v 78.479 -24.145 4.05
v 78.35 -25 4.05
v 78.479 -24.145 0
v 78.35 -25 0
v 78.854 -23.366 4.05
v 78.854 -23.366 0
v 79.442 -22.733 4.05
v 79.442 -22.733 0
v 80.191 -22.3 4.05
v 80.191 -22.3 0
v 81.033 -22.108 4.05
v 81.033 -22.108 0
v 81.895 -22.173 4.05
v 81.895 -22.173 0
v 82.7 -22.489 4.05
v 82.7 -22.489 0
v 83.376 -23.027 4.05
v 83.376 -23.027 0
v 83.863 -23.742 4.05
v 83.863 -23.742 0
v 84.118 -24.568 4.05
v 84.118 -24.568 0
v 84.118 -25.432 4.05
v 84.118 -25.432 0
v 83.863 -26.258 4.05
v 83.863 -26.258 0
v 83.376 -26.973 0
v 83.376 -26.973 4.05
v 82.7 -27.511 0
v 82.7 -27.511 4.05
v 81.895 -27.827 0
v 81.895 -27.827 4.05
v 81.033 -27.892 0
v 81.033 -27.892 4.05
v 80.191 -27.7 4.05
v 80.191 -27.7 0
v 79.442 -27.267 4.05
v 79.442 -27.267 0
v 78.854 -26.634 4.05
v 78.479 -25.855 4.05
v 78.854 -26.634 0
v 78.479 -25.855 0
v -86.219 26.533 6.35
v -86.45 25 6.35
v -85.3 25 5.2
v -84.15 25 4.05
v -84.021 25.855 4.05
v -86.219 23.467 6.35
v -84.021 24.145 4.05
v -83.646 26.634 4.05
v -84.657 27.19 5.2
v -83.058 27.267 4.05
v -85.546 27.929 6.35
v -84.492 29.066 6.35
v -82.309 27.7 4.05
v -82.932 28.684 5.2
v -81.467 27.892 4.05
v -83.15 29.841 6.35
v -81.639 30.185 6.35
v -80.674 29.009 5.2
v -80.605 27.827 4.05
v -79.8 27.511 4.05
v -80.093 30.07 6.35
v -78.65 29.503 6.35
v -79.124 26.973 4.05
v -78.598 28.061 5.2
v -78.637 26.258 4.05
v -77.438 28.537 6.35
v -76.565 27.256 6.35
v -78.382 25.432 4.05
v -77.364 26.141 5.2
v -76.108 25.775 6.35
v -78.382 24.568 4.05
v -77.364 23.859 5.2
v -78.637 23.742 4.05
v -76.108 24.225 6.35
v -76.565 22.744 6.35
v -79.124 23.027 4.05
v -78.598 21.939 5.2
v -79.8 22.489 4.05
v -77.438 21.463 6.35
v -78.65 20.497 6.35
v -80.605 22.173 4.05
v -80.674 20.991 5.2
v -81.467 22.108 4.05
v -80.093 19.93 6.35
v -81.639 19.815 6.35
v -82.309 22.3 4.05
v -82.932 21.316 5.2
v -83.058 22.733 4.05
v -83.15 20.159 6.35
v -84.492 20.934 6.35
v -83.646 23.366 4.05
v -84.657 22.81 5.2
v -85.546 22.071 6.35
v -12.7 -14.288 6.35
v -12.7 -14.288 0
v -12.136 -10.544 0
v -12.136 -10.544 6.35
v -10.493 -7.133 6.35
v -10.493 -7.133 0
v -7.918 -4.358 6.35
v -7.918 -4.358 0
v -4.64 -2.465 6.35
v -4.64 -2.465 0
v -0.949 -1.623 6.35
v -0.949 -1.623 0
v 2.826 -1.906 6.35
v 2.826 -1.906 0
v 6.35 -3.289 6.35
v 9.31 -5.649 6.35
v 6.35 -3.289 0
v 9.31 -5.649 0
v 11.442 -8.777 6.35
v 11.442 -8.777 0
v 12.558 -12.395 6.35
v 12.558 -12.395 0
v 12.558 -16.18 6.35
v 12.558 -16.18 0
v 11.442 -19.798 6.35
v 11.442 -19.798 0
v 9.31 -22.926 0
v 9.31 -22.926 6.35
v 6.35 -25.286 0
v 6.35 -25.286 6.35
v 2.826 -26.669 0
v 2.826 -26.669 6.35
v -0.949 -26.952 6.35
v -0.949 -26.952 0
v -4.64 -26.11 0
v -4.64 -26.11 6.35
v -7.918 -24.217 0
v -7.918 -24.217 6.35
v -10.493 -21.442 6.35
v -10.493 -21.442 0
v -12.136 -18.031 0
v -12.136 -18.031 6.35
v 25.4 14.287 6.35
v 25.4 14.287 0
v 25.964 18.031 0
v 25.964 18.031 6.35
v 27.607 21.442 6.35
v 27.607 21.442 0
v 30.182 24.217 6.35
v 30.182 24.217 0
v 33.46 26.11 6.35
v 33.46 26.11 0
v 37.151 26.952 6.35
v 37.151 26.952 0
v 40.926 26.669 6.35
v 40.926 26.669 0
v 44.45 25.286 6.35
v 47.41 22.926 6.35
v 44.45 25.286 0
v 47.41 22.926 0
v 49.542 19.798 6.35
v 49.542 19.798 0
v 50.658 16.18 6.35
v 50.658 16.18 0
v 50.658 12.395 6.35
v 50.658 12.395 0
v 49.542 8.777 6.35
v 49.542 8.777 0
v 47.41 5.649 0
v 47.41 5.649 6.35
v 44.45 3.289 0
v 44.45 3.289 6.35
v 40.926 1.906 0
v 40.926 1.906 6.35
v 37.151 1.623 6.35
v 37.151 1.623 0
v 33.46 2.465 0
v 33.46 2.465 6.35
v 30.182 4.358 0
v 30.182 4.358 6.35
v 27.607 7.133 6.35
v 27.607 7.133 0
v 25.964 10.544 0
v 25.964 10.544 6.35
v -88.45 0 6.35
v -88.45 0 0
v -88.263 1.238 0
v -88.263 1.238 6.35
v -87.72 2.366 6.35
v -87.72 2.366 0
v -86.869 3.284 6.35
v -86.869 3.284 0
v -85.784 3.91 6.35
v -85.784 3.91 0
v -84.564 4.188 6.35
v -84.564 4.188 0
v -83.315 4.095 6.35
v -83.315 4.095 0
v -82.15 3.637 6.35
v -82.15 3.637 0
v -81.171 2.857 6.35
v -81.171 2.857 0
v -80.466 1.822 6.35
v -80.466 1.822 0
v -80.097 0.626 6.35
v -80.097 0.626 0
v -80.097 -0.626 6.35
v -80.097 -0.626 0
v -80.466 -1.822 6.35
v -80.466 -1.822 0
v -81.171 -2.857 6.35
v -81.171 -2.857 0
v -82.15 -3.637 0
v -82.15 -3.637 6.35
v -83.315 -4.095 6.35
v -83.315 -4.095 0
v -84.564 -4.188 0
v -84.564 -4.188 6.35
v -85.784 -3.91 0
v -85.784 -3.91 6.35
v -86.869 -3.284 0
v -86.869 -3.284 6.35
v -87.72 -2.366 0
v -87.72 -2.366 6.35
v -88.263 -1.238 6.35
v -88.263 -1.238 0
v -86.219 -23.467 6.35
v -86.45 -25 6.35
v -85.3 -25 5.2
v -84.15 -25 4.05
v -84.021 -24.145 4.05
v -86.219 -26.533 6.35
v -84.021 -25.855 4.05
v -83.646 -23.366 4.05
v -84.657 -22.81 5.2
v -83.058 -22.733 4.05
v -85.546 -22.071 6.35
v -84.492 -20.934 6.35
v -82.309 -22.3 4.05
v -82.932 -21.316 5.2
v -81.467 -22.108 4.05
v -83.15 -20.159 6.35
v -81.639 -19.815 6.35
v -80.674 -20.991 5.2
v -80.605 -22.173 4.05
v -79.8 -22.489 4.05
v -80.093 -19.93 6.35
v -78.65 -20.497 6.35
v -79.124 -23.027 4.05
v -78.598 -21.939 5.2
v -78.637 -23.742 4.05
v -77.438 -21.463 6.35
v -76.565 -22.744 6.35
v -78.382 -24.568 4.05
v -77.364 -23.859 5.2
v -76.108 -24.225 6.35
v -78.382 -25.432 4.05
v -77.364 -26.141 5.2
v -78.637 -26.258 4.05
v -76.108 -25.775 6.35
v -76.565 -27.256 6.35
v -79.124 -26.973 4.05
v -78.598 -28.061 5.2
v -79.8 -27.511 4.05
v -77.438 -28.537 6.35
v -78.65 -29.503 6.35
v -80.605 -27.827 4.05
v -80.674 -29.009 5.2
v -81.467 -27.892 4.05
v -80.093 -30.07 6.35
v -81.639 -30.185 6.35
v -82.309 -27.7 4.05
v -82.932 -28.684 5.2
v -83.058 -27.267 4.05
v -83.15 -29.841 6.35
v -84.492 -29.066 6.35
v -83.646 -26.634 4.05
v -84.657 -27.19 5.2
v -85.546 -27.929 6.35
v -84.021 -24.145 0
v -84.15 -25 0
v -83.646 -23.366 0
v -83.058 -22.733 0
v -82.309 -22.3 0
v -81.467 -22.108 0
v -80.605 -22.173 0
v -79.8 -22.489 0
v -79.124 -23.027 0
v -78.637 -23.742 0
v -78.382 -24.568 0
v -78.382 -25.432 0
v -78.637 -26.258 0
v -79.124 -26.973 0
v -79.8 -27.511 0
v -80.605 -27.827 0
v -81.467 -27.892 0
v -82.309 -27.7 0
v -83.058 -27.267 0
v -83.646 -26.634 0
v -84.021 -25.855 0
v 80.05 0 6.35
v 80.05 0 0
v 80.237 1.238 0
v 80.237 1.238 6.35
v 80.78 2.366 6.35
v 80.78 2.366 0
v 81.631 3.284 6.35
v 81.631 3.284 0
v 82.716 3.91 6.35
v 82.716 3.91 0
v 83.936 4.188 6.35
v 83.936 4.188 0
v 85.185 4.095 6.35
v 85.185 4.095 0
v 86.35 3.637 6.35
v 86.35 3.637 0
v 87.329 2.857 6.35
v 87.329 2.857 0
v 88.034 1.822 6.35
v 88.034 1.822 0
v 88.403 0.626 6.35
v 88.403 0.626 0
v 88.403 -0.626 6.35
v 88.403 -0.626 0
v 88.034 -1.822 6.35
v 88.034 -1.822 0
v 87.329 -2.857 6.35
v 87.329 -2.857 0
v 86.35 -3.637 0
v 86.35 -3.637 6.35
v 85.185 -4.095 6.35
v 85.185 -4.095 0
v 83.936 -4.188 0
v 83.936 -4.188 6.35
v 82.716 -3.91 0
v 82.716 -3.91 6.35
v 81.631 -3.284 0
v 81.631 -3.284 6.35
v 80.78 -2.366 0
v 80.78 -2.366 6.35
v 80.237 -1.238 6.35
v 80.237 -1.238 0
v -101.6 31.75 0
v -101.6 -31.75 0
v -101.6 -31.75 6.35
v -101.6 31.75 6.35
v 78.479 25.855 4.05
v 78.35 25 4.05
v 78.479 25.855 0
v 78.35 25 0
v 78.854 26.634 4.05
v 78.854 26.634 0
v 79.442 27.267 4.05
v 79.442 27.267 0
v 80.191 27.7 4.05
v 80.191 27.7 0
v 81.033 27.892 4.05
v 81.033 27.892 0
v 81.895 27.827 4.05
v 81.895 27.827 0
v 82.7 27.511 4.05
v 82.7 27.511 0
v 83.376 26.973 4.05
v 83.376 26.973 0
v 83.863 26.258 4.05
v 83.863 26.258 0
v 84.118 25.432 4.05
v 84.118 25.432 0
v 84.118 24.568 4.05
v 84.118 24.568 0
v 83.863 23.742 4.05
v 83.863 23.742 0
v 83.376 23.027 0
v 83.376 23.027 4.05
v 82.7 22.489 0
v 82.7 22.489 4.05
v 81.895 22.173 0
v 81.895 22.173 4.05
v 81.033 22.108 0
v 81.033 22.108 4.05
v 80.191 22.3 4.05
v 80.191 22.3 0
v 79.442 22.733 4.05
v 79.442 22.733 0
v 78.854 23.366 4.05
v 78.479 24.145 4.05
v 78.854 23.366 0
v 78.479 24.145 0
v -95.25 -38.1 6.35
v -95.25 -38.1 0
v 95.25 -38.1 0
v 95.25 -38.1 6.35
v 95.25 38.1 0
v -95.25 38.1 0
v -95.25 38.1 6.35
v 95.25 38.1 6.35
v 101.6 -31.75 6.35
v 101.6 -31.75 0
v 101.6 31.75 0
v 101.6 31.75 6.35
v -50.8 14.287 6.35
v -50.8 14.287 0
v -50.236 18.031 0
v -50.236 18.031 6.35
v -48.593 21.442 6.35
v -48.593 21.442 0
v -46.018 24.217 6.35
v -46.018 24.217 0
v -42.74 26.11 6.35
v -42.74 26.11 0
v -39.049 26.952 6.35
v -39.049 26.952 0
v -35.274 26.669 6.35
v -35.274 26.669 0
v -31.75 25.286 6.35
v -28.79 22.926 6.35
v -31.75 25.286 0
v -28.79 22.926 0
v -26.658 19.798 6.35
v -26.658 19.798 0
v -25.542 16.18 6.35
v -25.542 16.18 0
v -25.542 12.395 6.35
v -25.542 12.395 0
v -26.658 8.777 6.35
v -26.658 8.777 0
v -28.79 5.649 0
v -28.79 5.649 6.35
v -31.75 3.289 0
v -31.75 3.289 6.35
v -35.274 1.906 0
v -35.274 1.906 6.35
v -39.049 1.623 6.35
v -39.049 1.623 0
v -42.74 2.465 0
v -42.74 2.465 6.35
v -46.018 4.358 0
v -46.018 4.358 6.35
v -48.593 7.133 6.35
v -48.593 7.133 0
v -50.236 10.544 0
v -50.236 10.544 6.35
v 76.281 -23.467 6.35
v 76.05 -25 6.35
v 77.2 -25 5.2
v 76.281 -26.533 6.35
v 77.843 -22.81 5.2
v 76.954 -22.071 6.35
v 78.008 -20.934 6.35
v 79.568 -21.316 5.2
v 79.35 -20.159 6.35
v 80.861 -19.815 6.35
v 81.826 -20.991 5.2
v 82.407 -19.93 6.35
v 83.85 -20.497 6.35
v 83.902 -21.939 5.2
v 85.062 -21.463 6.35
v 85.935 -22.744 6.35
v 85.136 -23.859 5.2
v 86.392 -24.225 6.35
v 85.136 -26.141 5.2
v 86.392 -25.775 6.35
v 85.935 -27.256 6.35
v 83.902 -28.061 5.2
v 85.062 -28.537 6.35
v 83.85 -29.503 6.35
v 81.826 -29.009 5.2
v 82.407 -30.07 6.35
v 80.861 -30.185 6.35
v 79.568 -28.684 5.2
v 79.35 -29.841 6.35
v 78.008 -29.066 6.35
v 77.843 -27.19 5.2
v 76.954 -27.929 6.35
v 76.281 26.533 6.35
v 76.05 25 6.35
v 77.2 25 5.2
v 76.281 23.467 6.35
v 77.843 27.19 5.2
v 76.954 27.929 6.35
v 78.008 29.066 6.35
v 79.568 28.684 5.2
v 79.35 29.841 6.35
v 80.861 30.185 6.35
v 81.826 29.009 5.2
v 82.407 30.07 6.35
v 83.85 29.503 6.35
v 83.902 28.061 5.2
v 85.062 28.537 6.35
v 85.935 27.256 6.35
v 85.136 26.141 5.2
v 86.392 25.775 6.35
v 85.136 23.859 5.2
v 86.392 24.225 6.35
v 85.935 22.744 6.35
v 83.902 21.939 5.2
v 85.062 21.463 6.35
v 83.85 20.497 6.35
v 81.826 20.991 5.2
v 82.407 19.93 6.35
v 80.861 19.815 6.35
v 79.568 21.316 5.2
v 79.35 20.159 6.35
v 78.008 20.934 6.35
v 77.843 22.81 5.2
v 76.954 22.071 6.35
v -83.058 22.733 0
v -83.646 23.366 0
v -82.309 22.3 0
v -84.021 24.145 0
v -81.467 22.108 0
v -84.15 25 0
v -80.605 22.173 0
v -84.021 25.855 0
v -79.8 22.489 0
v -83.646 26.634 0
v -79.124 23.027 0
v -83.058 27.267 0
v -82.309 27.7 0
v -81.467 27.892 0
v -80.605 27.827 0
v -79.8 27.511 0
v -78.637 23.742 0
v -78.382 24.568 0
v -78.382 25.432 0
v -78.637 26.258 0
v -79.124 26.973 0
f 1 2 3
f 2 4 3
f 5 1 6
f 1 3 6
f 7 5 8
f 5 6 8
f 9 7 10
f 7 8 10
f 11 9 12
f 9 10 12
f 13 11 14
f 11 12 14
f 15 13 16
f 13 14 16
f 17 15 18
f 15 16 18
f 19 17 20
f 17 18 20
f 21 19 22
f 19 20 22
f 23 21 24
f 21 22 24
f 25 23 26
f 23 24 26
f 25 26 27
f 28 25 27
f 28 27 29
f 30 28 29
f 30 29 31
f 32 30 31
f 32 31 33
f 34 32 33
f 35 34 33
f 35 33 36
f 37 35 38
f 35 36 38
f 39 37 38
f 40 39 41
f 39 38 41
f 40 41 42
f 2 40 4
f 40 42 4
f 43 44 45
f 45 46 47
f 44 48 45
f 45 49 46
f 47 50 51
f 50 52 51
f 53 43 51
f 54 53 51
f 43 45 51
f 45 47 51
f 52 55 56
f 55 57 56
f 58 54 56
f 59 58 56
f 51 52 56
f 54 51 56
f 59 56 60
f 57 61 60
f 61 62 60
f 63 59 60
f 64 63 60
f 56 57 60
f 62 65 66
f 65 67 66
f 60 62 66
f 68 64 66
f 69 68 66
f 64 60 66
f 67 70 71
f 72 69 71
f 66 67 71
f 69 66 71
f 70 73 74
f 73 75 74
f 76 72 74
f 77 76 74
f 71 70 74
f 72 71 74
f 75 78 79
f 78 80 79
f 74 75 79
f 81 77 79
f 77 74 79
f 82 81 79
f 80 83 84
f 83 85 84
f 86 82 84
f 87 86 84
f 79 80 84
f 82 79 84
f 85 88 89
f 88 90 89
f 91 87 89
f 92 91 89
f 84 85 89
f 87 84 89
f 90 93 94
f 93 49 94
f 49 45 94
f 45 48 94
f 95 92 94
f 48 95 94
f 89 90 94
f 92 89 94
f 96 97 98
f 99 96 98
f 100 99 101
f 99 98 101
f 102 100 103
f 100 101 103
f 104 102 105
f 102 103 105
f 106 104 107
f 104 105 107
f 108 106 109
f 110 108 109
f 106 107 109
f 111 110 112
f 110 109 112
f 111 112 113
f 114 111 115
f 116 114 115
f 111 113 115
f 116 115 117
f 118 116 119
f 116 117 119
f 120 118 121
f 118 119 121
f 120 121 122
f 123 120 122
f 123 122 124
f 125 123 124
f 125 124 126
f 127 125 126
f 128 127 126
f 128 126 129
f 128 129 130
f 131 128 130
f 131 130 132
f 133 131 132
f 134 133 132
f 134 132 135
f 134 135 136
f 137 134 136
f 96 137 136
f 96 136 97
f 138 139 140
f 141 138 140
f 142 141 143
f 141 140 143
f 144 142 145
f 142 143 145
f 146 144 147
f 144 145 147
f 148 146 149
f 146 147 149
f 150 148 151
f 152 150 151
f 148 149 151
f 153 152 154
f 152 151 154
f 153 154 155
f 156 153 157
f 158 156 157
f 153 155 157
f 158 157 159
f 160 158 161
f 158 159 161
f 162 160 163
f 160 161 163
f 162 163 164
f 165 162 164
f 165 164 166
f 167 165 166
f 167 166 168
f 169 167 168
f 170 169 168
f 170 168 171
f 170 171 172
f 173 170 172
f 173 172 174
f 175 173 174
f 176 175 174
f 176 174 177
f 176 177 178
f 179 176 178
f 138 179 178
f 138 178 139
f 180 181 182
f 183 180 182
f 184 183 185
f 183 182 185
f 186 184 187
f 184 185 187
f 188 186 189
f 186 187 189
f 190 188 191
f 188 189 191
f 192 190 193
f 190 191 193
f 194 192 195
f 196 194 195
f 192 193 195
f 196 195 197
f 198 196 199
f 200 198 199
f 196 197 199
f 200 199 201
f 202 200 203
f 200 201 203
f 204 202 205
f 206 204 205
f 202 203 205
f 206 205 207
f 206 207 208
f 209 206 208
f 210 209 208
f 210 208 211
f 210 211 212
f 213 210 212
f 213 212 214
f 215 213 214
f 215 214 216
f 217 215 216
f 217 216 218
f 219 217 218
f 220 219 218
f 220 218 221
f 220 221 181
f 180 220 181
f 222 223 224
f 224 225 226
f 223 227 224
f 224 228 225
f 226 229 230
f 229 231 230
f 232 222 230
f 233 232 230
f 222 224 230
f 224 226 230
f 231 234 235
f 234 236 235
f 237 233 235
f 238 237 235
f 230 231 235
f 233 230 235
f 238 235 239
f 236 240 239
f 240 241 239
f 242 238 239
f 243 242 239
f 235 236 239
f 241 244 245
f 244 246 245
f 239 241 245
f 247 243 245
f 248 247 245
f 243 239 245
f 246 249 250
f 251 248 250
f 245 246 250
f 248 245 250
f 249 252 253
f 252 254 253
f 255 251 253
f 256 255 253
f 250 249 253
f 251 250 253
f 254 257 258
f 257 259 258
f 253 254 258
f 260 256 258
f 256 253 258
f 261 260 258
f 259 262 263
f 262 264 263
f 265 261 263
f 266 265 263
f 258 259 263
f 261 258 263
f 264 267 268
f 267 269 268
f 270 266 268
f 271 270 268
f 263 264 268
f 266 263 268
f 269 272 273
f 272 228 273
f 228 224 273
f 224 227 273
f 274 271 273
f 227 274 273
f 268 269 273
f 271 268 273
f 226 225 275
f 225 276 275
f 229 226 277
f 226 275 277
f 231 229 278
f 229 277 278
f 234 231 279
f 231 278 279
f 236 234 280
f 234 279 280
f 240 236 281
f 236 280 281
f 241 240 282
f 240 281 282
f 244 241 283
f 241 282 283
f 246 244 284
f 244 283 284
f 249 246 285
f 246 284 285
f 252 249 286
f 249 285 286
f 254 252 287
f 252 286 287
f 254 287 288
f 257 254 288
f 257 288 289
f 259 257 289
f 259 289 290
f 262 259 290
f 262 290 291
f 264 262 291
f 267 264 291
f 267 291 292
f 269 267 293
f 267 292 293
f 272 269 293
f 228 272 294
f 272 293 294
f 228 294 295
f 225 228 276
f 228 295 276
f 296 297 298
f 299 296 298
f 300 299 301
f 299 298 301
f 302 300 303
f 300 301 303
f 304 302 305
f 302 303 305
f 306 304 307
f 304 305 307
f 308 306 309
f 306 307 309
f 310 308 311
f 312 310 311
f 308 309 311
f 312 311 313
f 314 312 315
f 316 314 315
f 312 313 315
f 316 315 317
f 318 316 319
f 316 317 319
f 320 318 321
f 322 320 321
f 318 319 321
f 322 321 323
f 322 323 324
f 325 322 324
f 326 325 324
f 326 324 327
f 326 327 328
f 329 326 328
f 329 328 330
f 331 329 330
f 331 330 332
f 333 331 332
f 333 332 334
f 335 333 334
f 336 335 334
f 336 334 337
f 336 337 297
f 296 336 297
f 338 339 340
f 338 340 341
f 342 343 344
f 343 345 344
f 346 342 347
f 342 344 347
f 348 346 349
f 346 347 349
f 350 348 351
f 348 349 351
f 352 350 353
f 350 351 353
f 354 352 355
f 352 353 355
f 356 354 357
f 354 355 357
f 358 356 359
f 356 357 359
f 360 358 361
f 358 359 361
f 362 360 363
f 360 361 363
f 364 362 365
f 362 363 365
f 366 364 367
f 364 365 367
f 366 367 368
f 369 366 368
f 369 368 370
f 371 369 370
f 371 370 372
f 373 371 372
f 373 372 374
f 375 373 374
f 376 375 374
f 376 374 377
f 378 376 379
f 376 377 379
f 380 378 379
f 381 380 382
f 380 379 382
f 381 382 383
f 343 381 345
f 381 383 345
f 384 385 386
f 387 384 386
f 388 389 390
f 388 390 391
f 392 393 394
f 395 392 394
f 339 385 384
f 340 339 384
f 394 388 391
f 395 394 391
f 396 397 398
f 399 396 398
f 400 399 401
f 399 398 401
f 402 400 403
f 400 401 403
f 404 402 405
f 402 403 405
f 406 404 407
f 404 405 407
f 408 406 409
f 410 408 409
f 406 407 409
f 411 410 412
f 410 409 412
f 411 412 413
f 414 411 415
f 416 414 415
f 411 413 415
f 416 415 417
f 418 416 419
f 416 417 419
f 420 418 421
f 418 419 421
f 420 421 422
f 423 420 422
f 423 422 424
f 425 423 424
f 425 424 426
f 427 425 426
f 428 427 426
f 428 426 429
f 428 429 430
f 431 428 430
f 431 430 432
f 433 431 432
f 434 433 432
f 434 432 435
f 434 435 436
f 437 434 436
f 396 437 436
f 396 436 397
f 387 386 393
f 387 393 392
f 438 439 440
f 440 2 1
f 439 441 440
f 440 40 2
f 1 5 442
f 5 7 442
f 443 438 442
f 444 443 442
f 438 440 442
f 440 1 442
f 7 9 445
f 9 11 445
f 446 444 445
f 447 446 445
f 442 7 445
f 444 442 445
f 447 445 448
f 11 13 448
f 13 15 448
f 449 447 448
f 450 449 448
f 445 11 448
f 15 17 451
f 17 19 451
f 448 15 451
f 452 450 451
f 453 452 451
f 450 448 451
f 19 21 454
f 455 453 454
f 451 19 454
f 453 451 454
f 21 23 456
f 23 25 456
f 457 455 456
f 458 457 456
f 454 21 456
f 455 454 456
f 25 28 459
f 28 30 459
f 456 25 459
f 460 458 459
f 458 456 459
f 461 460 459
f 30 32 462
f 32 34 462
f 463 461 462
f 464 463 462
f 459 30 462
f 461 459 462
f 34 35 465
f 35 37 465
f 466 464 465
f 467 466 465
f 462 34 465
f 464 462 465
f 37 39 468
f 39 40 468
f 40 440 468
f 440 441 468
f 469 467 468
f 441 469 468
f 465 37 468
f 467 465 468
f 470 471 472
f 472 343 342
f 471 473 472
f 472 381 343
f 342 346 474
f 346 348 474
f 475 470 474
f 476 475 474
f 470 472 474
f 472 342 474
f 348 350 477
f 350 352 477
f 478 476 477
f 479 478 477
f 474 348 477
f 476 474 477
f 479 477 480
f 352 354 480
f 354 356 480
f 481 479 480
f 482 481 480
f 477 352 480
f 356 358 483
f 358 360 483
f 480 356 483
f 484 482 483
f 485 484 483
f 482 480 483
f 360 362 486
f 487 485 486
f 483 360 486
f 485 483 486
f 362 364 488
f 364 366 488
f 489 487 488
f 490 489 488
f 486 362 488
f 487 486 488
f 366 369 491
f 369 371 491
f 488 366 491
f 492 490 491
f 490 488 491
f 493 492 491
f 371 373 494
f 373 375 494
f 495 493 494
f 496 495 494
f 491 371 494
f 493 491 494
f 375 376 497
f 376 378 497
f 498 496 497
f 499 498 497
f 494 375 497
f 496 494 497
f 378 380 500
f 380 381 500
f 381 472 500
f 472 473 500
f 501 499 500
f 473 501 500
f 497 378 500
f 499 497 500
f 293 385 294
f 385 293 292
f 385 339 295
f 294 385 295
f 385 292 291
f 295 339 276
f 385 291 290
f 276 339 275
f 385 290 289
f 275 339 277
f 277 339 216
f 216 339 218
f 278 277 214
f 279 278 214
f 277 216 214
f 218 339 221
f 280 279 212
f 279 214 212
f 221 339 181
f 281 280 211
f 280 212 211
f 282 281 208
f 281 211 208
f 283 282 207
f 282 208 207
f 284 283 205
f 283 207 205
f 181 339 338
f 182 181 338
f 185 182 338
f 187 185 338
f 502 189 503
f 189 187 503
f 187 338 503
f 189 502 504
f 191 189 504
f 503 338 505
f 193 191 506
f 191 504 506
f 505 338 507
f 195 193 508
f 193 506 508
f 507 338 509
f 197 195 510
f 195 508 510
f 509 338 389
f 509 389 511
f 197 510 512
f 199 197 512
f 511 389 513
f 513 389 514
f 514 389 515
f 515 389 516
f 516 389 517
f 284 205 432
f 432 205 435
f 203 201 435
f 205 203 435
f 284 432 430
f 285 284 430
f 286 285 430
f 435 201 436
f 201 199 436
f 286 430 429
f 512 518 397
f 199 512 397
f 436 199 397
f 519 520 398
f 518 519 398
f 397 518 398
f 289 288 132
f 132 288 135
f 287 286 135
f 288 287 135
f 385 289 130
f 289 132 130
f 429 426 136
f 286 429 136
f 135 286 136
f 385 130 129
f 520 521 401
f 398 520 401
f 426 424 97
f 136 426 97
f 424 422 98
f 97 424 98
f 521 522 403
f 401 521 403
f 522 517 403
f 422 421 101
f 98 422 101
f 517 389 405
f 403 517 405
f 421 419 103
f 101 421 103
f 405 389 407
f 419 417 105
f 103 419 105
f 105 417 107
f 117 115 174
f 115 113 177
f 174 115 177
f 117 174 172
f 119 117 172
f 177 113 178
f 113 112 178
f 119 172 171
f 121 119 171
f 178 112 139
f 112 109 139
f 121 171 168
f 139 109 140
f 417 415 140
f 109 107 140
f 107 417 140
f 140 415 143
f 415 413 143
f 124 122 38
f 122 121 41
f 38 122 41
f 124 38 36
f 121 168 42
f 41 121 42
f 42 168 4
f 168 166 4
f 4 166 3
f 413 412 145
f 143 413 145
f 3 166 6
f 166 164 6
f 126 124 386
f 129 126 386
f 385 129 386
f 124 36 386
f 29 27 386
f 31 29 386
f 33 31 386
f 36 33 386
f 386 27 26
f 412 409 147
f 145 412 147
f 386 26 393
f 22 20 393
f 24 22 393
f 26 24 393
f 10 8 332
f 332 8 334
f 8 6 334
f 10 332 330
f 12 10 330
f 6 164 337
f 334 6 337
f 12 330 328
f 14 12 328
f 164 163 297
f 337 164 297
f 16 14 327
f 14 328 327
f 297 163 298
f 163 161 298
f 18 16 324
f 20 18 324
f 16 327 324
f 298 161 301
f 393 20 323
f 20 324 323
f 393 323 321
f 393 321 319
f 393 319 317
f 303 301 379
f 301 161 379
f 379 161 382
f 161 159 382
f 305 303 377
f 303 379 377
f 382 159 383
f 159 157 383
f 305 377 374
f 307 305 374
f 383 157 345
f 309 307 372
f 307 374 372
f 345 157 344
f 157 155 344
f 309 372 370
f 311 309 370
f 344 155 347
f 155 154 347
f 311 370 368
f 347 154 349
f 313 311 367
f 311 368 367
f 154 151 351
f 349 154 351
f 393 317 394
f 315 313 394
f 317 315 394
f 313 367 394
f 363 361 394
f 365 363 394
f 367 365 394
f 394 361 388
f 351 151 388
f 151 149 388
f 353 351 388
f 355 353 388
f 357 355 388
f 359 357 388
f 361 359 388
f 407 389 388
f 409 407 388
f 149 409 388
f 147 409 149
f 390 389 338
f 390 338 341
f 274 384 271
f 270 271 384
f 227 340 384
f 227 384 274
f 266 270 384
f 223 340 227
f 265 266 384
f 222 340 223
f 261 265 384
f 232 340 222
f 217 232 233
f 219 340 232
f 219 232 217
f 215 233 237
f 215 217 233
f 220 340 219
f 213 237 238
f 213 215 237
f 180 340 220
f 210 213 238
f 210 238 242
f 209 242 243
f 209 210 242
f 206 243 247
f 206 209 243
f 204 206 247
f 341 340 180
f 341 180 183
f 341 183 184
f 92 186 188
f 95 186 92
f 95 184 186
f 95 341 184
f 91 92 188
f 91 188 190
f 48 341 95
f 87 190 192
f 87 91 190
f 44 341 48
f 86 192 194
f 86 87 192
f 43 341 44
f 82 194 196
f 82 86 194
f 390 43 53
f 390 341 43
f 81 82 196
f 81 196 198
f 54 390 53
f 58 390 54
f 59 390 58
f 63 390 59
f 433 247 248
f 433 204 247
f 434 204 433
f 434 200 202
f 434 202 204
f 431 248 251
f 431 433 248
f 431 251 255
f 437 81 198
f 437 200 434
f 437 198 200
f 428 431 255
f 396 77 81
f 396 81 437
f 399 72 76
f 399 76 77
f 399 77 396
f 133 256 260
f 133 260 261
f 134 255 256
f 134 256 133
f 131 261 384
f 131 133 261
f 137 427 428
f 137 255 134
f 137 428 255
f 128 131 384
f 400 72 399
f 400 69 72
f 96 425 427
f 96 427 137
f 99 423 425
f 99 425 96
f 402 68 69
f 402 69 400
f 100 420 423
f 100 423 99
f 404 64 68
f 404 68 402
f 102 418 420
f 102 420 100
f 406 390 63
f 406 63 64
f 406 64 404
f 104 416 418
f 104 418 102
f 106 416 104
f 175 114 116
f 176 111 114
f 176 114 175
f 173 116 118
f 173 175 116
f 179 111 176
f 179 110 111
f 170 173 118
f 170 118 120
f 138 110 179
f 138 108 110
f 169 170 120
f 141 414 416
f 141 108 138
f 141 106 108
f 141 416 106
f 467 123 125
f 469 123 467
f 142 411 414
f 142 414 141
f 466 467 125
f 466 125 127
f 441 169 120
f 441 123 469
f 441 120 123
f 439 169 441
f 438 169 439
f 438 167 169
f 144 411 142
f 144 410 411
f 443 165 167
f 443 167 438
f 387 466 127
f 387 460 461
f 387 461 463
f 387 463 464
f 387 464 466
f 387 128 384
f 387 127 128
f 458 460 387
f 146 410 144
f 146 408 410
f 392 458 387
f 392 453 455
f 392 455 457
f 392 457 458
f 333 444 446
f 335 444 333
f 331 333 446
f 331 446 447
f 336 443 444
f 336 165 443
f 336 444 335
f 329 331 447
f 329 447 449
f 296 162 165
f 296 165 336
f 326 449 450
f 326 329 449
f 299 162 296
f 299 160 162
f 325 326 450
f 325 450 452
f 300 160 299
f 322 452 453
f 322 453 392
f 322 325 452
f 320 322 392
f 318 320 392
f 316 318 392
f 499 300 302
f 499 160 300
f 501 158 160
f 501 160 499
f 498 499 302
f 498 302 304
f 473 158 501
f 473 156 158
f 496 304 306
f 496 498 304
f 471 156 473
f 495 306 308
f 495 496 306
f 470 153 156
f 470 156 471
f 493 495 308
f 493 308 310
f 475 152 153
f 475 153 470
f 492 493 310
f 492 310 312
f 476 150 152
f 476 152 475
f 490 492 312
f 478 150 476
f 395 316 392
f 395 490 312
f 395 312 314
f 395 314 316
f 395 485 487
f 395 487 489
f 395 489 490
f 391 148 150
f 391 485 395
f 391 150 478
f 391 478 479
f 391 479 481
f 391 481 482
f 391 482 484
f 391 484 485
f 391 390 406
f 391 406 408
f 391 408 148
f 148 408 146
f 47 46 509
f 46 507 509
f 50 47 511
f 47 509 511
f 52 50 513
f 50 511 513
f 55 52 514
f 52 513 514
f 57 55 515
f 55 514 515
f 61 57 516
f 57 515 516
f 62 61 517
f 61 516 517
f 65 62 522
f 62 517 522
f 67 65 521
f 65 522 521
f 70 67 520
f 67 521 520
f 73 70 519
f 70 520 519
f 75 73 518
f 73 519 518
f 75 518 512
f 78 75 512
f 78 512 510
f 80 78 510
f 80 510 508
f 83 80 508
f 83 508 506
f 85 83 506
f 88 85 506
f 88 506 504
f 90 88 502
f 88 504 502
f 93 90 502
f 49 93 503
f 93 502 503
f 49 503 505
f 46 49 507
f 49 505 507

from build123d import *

# Parameters (mm, degrees)
SKETCH1_W                                       = 203.2
SKETCH1_H                                       = 76.2
BOSS_EXTRUDE1_DEPTH                             = 6.35
M8_CLEARANCE_HOLE1_D                            = 8.4
M8_CLEARANCE_HOLE1_DEPTH                        = 10.668
M8_CLEARANCE_HOLE1_TIP                          = 2.5236146
CHAMFER1_SIZE                                   = 6.35
CSK_FOR_M5_FLAT_HEAD_MACHINE_SCREW1_D           = 5.8
CSK_FOR_M5_FLAT_HEAD_MACHINE_SCREW1_CSINK_D     = 10.4
CSK_FOR_M5_FLAT_HEAD_MACHINE_SCREW1_CSINK_ANGLE = 90
F_1_1_DIAMETER_HOLE1_D                          = 25.4


with BuildPart() as part:
    # Sketch1 → Boss-Extrude1 (new body)
    with BuildSketch(Plane.XY):
        Rectangle(SKETCH1_W, SKETCH1_H)
    extrude(amount=BOSS_EXTRUDE1_DEPTH)

    # M8 Clearance Hole1
    with Locations(Plane.XY.offset(6.35)):
        with Locations((84.25, 0), (-84.25, 0)):
            Hole(M8_CLEARANCE_HOLE1_D / 2, depth=M8_CLEARANCE_HOLE1_DEPTH)
            with Locations((0, 0, -(M8_CLEARANCE_HOLE1_DEPTH + M8_CLEARANCE_HOLE1_TIP / 2))):  # 118° drill point
                Cone(0, M8_CLEARANCE_HOLE1_D / 2, M8_CLEARANCE_HOLE1_TIP, mode=Mode.SUBTRACT)

    # Chamfer1
    chamfer1_edges = [part.edges().sort_by_distance(p)[0] for p in [
        (-101.6, 38.1, 3.175),
        (101.6, 38.1, 3.175),
        (101.6, -38.1, 3.175),
        (-101.6, -38.1, 3.175),
    ]]
    chamfer(chamfer1_edges, length=CHAMFER1_SIZE)

    # CSK for M5 Flat Head Machine Screw1 (through all)
    with Locations(Plane.XY.offset(6.35)):
        with Locations((81.25, 25), (81.25, -25), (-81.25, -25), (-81.25, 25)):
            CounterSinkHole(CSK_FOR_M5_FLAT_HEAD_MACHINE_SCREW1_D / 2, CSK_FOR_M5_FLAT_HEAD_MACHINE_SCREW1_CSINK_D / 2, counter_sink_angle=CSK_FOR_M5_FLAT_HEAD_MACHINE_SCREW1_CSINK_ANGLE)

    # 1 (1) Diameter Hole1 (through all)
    with Locations(Plane.XY.offset(6.35)):
        with Locations((0, -14.2875), (-38.1, 14.2875), (38.1, 14.2875)):
            Hole(F_1_1_DIAMETER_HOLE1_D / 2)


solid = part.part
